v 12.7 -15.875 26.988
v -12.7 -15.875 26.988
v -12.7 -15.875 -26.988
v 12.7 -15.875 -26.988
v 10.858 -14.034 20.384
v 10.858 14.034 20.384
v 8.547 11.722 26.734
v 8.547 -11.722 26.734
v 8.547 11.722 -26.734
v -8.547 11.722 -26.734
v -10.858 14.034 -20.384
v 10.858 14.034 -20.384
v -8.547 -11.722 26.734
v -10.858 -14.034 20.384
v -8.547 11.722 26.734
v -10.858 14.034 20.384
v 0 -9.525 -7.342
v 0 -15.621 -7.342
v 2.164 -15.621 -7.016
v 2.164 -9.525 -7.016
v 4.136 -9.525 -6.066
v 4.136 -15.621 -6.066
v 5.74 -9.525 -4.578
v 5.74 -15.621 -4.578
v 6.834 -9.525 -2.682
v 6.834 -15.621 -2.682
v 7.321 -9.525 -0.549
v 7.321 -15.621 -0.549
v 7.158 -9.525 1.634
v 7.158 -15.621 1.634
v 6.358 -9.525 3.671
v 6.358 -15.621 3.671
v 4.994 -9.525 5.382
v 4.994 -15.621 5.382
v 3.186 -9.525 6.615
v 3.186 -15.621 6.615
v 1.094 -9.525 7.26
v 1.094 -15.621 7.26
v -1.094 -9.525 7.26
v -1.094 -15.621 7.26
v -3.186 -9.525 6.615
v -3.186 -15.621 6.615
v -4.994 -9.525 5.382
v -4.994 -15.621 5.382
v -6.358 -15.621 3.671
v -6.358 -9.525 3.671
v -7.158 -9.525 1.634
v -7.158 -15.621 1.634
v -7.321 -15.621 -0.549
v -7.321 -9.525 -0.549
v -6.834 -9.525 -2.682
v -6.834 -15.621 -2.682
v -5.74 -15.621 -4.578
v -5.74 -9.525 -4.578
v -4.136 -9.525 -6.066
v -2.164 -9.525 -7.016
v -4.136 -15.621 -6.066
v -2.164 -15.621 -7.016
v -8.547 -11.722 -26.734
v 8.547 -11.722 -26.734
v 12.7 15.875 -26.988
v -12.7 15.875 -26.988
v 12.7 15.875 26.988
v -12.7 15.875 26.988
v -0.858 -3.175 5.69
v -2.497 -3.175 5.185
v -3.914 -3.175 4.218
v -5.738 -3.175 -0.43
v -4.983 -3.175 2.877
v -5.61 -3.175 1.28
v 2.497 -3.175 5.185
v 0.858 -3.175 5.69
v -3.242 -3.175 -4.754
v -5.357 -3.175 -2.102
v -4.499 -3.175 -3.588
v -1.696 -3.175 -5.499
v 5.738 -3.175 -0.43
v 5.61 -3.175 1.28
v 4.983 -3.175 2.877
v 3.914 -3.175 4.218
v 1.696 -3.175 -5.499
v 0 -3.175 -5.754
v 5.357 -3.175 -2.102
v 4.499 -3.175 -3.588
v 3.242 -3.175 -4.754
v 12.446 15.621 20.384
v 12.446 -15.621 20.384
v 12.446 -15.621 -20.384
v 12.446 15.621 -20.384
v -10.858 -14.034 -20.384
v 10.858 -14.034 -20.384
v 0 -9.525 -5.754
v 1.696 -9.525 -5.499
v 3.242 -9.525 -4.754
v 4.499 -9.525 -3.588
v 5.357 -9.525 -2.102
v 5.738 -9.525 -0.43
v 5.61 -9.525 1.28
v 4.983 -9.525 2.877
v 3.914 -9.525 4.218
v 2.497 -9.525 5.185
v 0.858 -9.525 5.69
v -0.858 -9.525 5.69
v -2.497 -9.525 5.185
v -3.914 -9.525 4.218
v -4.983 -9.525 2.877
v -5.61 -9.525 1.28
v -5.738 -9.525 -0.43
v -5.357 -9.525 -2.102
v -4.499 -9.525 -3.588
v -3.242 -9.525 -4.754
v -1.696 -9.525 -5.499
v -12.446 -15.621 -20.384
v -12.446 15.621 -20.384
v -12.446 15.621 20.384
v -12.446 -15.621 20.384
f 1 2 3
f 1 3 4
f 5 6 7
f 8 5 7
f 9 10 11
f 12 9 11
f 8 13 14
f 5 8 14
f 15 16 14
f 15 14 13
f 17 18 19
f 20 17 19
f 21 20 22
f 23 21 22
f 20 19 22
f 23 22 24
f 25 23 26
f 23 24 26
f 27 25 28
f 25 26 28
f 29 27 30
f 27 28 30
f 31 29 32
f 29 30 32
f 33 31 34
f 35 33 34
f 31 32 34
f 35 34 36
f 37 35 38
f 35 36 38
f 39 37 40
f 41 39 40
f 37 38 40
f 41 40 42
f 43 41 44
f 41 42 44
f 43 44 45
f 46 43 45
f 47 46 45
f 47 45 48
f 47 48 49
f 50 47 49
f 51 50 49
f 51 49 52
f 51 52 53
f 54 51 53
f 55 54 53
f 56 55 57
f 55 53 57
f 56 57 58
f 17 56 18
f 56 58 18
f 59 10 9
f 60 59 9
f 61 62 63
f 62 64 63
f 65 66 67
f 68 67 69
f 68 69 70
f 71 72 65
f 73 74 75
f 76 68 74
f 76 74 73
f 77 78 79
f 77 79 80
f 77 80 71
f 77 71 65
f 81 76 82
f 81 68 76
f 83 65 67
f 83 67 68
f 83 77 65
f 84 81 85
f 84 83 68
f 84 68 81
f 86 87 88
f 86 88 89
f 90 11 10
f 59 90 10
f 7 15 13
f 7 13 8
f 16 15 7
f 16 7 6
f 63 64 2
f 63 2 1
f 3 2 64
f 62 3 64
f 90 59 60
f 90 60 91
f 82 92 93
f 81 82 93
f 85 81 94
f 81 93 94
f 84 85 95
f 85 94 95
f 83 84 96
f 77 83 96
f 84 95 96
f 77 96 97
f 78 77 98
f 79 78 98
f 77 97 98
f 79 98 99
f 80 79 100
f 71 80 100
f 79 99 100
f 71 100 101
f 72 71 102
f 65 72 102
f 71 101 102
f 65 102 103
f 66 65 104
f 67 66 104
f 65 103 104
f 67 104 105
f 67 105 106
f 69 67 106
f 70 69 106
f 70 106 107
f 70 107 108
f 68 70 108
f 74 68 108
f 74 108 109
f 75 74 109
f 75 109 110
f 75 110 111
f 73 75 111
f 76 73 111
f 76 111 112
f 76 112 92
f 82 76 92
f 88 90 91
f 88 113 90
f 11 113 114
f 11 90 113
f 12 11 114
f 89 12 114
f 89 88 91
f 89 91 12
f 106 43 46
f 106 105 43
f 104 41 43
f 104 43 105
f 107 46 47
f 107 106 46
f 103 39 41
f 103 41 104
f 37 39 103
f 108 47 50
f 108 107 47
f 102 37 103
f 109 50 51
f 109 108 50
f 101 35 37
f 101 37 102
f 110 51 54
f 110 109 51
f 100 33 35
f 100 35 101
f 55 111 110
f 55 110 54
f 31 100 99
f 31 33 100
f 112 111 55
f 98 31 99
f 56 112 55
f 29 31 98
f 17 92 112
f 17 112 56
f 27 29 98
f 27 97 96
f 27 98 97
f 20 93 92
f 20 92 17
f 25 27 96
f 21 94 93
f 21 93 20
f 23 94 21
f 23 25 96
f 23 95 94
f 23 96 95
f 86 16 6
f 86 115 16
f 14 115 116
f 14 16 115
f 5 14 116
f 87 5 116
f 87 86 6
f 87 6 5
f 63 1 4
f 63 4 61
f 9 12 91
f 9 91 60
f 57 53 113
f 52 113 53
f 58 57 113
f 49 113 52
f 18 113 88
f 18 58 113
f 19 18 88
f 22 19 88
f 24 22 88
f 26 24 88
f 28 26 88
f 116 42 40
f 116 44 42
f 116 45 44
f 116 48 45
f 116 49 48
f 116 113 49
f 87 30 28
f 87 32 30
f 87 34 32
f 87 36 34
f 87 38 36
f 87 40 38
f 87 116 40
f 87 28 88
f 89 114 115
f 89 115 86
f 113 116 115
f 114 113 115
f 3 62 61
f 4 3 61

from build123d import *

# Parameters (mm, degrees)
SKETCH1_W            = 25.4
SKETCH1_H            = 31.75
BOSS_EXTRUDE1_DEPTH  = 26.9875
SKETCH2_W            = 24.892
SKETCH2_H            = 31.242
BOSS_EXTRUDE2_DEPTH  = 26.7335
CUT_EXTRUDE1_DEPTH   = 41.157964307
MIRROR2_COPY_1_DEPTH = 41.157964307
CUT_EXTRUDE2_DEPTH   = 44.37756531
MIRROR4_COPY_1_DEPTH = 44.37756531
SKETCH6_R            = 5.75437
CUT_EXTRUDE3_DEPTH   = 12.446
SKETCH7_R            = 7.34187
CUT_EXTRUDE5_DEPTH   = 6.096


with BuildPart() as part:
    # Sketch1 → Boss-Extrude1 (new, symmetric)
    with BuildSketch(Plane.XY):
        Rectangle(SKETCH1_W, SKETCH1_H)
    extrude(amount=BOSS_EXTRUDE1_DEPTH, both=True)


with BuildPart() as body_2:
    # Sketch2 → Boss-Extrude2 (new, symmetric)
    with BuildSketch(Plane.XY):
        Rectangle(SKETCH2_W, SKETCH2_H)
    extrude(amount=BOSS_EXTRUDE2_DEPTH, both=True)

    # Sketch3 → Cut-Extrude1 (cut, through all)
    with BuildSketch(Plane(origin=(12.446, 0, 0), x_dir=(0, 0, -1), z_dir=(1, 0, 0))):
        Polygon((-26.7335, 11.722289012), (-20.3835, 14.0335), (-20.3835, 15.621), (-26.7335, 15.621), align=None)
    cut_extrude1 = extrude(amount=-CUT_EXTRUDE1_DEPTH, mode=Mode.SUBTRACT)

    # Mirror1: Cut-Extrude1 across plane
    add(cut_extrude1.mirror(Plane.ZX), mode=Mode.SUBTRACT)

    # Mirror2: Cut-Extrude1 across plane
    add(cut_extrude1.mirror(Plane.XY), mode=Mode.SUBTRACT)

    # Mirror2 copy 1 sketch → Mirror2 copy 1 (cut, through all)
    with BuildSketch(Plane(origin=(12.446, 0, 0), x_dir=(0, 0, 1), z_dir=(1, 0, 0))):
        Polygon((-26.7335, 11.722289012), (-20.3835, 14.0335), (-20.3835, 15.621), (-26.7335, 15.621), align=None)
    extrude(amount=-MIRROR2_COPY_1_DEPTH, mode=Mode.SUBTRACT)

    # Sketch4 → Cut-Extrude2 (cut, symmetric)
    with BuildSketch(Plane(origin=(0, 15.621, 0), x_dir=(1, 0, 0), z_dir=(0, 1, 0))):
        Polygon((-12.446, 26.7335), (-12.446, 20.3835), (-10.8585, 20.3835), (-8.547289012, 26.7335), align=None)
    cut_extrude2 = extrude(amount=CUT_EXTRUDE2_DEPTH, both=True, mode=Mode.SUBTRACT)

    # Mirror3: Cut-Extrude2 across plane
    add(cut_extrude2.mirror(Plane(origin=(0, 0, 0), x_dir=(0, 0, 1), z_dir=(1, 0, 0))), mode=Mode.SUBTRACT)

    # Mirror4: Cut-Extrude2 across plane
    add(cut_extrude2.mirror(Plane.XY), mode=Mode.SUBTRACT)

    # Mirror4 copy 1 sketch → Mirror4 copy 1 (cut, symmetric)
    with BuildSketch(Plane(origin=(0, 15.621, 0), x_dir=(-1, 0, 0), z_dir=(0, 1, 0))):
        Polygon((-12.446, 26.7335), (-12.446, 20.3835), (-10.8585, 20.3835), (-8.547289012, 26.7335), align=None)
    extrude(amount=MIRROR4_COPY_1_DEPTH, both=True, mode=Mode.SUBTRACT)

    # Sketch6 → Cut-Extrude3 (cut)
    with BuildSketch(Plane.XZ.offset(15.621)):
        with Locations(Location((0, 0, 0), (0, 0, 270))):
            Circle(SKETCH6_R)
    extrude(amount=-CUT_EXTRUDE3_DEPTH, mode=Mode.SUBTRACT)

    # Sketch7 → Cut-Extrude5 (cut)
    with BuildSketch(Plane.XZ.offset(15.621)):
        with Locations(Location((0, 0, 0), (0, 0, 270))):
            Circle(SKETCH7_R)
    extrude(amount=-CUT_EXTRUDE5_DEPTH, mode=Mode.SUBTRACT)


solid = Compound([part.part, body_2.part])
